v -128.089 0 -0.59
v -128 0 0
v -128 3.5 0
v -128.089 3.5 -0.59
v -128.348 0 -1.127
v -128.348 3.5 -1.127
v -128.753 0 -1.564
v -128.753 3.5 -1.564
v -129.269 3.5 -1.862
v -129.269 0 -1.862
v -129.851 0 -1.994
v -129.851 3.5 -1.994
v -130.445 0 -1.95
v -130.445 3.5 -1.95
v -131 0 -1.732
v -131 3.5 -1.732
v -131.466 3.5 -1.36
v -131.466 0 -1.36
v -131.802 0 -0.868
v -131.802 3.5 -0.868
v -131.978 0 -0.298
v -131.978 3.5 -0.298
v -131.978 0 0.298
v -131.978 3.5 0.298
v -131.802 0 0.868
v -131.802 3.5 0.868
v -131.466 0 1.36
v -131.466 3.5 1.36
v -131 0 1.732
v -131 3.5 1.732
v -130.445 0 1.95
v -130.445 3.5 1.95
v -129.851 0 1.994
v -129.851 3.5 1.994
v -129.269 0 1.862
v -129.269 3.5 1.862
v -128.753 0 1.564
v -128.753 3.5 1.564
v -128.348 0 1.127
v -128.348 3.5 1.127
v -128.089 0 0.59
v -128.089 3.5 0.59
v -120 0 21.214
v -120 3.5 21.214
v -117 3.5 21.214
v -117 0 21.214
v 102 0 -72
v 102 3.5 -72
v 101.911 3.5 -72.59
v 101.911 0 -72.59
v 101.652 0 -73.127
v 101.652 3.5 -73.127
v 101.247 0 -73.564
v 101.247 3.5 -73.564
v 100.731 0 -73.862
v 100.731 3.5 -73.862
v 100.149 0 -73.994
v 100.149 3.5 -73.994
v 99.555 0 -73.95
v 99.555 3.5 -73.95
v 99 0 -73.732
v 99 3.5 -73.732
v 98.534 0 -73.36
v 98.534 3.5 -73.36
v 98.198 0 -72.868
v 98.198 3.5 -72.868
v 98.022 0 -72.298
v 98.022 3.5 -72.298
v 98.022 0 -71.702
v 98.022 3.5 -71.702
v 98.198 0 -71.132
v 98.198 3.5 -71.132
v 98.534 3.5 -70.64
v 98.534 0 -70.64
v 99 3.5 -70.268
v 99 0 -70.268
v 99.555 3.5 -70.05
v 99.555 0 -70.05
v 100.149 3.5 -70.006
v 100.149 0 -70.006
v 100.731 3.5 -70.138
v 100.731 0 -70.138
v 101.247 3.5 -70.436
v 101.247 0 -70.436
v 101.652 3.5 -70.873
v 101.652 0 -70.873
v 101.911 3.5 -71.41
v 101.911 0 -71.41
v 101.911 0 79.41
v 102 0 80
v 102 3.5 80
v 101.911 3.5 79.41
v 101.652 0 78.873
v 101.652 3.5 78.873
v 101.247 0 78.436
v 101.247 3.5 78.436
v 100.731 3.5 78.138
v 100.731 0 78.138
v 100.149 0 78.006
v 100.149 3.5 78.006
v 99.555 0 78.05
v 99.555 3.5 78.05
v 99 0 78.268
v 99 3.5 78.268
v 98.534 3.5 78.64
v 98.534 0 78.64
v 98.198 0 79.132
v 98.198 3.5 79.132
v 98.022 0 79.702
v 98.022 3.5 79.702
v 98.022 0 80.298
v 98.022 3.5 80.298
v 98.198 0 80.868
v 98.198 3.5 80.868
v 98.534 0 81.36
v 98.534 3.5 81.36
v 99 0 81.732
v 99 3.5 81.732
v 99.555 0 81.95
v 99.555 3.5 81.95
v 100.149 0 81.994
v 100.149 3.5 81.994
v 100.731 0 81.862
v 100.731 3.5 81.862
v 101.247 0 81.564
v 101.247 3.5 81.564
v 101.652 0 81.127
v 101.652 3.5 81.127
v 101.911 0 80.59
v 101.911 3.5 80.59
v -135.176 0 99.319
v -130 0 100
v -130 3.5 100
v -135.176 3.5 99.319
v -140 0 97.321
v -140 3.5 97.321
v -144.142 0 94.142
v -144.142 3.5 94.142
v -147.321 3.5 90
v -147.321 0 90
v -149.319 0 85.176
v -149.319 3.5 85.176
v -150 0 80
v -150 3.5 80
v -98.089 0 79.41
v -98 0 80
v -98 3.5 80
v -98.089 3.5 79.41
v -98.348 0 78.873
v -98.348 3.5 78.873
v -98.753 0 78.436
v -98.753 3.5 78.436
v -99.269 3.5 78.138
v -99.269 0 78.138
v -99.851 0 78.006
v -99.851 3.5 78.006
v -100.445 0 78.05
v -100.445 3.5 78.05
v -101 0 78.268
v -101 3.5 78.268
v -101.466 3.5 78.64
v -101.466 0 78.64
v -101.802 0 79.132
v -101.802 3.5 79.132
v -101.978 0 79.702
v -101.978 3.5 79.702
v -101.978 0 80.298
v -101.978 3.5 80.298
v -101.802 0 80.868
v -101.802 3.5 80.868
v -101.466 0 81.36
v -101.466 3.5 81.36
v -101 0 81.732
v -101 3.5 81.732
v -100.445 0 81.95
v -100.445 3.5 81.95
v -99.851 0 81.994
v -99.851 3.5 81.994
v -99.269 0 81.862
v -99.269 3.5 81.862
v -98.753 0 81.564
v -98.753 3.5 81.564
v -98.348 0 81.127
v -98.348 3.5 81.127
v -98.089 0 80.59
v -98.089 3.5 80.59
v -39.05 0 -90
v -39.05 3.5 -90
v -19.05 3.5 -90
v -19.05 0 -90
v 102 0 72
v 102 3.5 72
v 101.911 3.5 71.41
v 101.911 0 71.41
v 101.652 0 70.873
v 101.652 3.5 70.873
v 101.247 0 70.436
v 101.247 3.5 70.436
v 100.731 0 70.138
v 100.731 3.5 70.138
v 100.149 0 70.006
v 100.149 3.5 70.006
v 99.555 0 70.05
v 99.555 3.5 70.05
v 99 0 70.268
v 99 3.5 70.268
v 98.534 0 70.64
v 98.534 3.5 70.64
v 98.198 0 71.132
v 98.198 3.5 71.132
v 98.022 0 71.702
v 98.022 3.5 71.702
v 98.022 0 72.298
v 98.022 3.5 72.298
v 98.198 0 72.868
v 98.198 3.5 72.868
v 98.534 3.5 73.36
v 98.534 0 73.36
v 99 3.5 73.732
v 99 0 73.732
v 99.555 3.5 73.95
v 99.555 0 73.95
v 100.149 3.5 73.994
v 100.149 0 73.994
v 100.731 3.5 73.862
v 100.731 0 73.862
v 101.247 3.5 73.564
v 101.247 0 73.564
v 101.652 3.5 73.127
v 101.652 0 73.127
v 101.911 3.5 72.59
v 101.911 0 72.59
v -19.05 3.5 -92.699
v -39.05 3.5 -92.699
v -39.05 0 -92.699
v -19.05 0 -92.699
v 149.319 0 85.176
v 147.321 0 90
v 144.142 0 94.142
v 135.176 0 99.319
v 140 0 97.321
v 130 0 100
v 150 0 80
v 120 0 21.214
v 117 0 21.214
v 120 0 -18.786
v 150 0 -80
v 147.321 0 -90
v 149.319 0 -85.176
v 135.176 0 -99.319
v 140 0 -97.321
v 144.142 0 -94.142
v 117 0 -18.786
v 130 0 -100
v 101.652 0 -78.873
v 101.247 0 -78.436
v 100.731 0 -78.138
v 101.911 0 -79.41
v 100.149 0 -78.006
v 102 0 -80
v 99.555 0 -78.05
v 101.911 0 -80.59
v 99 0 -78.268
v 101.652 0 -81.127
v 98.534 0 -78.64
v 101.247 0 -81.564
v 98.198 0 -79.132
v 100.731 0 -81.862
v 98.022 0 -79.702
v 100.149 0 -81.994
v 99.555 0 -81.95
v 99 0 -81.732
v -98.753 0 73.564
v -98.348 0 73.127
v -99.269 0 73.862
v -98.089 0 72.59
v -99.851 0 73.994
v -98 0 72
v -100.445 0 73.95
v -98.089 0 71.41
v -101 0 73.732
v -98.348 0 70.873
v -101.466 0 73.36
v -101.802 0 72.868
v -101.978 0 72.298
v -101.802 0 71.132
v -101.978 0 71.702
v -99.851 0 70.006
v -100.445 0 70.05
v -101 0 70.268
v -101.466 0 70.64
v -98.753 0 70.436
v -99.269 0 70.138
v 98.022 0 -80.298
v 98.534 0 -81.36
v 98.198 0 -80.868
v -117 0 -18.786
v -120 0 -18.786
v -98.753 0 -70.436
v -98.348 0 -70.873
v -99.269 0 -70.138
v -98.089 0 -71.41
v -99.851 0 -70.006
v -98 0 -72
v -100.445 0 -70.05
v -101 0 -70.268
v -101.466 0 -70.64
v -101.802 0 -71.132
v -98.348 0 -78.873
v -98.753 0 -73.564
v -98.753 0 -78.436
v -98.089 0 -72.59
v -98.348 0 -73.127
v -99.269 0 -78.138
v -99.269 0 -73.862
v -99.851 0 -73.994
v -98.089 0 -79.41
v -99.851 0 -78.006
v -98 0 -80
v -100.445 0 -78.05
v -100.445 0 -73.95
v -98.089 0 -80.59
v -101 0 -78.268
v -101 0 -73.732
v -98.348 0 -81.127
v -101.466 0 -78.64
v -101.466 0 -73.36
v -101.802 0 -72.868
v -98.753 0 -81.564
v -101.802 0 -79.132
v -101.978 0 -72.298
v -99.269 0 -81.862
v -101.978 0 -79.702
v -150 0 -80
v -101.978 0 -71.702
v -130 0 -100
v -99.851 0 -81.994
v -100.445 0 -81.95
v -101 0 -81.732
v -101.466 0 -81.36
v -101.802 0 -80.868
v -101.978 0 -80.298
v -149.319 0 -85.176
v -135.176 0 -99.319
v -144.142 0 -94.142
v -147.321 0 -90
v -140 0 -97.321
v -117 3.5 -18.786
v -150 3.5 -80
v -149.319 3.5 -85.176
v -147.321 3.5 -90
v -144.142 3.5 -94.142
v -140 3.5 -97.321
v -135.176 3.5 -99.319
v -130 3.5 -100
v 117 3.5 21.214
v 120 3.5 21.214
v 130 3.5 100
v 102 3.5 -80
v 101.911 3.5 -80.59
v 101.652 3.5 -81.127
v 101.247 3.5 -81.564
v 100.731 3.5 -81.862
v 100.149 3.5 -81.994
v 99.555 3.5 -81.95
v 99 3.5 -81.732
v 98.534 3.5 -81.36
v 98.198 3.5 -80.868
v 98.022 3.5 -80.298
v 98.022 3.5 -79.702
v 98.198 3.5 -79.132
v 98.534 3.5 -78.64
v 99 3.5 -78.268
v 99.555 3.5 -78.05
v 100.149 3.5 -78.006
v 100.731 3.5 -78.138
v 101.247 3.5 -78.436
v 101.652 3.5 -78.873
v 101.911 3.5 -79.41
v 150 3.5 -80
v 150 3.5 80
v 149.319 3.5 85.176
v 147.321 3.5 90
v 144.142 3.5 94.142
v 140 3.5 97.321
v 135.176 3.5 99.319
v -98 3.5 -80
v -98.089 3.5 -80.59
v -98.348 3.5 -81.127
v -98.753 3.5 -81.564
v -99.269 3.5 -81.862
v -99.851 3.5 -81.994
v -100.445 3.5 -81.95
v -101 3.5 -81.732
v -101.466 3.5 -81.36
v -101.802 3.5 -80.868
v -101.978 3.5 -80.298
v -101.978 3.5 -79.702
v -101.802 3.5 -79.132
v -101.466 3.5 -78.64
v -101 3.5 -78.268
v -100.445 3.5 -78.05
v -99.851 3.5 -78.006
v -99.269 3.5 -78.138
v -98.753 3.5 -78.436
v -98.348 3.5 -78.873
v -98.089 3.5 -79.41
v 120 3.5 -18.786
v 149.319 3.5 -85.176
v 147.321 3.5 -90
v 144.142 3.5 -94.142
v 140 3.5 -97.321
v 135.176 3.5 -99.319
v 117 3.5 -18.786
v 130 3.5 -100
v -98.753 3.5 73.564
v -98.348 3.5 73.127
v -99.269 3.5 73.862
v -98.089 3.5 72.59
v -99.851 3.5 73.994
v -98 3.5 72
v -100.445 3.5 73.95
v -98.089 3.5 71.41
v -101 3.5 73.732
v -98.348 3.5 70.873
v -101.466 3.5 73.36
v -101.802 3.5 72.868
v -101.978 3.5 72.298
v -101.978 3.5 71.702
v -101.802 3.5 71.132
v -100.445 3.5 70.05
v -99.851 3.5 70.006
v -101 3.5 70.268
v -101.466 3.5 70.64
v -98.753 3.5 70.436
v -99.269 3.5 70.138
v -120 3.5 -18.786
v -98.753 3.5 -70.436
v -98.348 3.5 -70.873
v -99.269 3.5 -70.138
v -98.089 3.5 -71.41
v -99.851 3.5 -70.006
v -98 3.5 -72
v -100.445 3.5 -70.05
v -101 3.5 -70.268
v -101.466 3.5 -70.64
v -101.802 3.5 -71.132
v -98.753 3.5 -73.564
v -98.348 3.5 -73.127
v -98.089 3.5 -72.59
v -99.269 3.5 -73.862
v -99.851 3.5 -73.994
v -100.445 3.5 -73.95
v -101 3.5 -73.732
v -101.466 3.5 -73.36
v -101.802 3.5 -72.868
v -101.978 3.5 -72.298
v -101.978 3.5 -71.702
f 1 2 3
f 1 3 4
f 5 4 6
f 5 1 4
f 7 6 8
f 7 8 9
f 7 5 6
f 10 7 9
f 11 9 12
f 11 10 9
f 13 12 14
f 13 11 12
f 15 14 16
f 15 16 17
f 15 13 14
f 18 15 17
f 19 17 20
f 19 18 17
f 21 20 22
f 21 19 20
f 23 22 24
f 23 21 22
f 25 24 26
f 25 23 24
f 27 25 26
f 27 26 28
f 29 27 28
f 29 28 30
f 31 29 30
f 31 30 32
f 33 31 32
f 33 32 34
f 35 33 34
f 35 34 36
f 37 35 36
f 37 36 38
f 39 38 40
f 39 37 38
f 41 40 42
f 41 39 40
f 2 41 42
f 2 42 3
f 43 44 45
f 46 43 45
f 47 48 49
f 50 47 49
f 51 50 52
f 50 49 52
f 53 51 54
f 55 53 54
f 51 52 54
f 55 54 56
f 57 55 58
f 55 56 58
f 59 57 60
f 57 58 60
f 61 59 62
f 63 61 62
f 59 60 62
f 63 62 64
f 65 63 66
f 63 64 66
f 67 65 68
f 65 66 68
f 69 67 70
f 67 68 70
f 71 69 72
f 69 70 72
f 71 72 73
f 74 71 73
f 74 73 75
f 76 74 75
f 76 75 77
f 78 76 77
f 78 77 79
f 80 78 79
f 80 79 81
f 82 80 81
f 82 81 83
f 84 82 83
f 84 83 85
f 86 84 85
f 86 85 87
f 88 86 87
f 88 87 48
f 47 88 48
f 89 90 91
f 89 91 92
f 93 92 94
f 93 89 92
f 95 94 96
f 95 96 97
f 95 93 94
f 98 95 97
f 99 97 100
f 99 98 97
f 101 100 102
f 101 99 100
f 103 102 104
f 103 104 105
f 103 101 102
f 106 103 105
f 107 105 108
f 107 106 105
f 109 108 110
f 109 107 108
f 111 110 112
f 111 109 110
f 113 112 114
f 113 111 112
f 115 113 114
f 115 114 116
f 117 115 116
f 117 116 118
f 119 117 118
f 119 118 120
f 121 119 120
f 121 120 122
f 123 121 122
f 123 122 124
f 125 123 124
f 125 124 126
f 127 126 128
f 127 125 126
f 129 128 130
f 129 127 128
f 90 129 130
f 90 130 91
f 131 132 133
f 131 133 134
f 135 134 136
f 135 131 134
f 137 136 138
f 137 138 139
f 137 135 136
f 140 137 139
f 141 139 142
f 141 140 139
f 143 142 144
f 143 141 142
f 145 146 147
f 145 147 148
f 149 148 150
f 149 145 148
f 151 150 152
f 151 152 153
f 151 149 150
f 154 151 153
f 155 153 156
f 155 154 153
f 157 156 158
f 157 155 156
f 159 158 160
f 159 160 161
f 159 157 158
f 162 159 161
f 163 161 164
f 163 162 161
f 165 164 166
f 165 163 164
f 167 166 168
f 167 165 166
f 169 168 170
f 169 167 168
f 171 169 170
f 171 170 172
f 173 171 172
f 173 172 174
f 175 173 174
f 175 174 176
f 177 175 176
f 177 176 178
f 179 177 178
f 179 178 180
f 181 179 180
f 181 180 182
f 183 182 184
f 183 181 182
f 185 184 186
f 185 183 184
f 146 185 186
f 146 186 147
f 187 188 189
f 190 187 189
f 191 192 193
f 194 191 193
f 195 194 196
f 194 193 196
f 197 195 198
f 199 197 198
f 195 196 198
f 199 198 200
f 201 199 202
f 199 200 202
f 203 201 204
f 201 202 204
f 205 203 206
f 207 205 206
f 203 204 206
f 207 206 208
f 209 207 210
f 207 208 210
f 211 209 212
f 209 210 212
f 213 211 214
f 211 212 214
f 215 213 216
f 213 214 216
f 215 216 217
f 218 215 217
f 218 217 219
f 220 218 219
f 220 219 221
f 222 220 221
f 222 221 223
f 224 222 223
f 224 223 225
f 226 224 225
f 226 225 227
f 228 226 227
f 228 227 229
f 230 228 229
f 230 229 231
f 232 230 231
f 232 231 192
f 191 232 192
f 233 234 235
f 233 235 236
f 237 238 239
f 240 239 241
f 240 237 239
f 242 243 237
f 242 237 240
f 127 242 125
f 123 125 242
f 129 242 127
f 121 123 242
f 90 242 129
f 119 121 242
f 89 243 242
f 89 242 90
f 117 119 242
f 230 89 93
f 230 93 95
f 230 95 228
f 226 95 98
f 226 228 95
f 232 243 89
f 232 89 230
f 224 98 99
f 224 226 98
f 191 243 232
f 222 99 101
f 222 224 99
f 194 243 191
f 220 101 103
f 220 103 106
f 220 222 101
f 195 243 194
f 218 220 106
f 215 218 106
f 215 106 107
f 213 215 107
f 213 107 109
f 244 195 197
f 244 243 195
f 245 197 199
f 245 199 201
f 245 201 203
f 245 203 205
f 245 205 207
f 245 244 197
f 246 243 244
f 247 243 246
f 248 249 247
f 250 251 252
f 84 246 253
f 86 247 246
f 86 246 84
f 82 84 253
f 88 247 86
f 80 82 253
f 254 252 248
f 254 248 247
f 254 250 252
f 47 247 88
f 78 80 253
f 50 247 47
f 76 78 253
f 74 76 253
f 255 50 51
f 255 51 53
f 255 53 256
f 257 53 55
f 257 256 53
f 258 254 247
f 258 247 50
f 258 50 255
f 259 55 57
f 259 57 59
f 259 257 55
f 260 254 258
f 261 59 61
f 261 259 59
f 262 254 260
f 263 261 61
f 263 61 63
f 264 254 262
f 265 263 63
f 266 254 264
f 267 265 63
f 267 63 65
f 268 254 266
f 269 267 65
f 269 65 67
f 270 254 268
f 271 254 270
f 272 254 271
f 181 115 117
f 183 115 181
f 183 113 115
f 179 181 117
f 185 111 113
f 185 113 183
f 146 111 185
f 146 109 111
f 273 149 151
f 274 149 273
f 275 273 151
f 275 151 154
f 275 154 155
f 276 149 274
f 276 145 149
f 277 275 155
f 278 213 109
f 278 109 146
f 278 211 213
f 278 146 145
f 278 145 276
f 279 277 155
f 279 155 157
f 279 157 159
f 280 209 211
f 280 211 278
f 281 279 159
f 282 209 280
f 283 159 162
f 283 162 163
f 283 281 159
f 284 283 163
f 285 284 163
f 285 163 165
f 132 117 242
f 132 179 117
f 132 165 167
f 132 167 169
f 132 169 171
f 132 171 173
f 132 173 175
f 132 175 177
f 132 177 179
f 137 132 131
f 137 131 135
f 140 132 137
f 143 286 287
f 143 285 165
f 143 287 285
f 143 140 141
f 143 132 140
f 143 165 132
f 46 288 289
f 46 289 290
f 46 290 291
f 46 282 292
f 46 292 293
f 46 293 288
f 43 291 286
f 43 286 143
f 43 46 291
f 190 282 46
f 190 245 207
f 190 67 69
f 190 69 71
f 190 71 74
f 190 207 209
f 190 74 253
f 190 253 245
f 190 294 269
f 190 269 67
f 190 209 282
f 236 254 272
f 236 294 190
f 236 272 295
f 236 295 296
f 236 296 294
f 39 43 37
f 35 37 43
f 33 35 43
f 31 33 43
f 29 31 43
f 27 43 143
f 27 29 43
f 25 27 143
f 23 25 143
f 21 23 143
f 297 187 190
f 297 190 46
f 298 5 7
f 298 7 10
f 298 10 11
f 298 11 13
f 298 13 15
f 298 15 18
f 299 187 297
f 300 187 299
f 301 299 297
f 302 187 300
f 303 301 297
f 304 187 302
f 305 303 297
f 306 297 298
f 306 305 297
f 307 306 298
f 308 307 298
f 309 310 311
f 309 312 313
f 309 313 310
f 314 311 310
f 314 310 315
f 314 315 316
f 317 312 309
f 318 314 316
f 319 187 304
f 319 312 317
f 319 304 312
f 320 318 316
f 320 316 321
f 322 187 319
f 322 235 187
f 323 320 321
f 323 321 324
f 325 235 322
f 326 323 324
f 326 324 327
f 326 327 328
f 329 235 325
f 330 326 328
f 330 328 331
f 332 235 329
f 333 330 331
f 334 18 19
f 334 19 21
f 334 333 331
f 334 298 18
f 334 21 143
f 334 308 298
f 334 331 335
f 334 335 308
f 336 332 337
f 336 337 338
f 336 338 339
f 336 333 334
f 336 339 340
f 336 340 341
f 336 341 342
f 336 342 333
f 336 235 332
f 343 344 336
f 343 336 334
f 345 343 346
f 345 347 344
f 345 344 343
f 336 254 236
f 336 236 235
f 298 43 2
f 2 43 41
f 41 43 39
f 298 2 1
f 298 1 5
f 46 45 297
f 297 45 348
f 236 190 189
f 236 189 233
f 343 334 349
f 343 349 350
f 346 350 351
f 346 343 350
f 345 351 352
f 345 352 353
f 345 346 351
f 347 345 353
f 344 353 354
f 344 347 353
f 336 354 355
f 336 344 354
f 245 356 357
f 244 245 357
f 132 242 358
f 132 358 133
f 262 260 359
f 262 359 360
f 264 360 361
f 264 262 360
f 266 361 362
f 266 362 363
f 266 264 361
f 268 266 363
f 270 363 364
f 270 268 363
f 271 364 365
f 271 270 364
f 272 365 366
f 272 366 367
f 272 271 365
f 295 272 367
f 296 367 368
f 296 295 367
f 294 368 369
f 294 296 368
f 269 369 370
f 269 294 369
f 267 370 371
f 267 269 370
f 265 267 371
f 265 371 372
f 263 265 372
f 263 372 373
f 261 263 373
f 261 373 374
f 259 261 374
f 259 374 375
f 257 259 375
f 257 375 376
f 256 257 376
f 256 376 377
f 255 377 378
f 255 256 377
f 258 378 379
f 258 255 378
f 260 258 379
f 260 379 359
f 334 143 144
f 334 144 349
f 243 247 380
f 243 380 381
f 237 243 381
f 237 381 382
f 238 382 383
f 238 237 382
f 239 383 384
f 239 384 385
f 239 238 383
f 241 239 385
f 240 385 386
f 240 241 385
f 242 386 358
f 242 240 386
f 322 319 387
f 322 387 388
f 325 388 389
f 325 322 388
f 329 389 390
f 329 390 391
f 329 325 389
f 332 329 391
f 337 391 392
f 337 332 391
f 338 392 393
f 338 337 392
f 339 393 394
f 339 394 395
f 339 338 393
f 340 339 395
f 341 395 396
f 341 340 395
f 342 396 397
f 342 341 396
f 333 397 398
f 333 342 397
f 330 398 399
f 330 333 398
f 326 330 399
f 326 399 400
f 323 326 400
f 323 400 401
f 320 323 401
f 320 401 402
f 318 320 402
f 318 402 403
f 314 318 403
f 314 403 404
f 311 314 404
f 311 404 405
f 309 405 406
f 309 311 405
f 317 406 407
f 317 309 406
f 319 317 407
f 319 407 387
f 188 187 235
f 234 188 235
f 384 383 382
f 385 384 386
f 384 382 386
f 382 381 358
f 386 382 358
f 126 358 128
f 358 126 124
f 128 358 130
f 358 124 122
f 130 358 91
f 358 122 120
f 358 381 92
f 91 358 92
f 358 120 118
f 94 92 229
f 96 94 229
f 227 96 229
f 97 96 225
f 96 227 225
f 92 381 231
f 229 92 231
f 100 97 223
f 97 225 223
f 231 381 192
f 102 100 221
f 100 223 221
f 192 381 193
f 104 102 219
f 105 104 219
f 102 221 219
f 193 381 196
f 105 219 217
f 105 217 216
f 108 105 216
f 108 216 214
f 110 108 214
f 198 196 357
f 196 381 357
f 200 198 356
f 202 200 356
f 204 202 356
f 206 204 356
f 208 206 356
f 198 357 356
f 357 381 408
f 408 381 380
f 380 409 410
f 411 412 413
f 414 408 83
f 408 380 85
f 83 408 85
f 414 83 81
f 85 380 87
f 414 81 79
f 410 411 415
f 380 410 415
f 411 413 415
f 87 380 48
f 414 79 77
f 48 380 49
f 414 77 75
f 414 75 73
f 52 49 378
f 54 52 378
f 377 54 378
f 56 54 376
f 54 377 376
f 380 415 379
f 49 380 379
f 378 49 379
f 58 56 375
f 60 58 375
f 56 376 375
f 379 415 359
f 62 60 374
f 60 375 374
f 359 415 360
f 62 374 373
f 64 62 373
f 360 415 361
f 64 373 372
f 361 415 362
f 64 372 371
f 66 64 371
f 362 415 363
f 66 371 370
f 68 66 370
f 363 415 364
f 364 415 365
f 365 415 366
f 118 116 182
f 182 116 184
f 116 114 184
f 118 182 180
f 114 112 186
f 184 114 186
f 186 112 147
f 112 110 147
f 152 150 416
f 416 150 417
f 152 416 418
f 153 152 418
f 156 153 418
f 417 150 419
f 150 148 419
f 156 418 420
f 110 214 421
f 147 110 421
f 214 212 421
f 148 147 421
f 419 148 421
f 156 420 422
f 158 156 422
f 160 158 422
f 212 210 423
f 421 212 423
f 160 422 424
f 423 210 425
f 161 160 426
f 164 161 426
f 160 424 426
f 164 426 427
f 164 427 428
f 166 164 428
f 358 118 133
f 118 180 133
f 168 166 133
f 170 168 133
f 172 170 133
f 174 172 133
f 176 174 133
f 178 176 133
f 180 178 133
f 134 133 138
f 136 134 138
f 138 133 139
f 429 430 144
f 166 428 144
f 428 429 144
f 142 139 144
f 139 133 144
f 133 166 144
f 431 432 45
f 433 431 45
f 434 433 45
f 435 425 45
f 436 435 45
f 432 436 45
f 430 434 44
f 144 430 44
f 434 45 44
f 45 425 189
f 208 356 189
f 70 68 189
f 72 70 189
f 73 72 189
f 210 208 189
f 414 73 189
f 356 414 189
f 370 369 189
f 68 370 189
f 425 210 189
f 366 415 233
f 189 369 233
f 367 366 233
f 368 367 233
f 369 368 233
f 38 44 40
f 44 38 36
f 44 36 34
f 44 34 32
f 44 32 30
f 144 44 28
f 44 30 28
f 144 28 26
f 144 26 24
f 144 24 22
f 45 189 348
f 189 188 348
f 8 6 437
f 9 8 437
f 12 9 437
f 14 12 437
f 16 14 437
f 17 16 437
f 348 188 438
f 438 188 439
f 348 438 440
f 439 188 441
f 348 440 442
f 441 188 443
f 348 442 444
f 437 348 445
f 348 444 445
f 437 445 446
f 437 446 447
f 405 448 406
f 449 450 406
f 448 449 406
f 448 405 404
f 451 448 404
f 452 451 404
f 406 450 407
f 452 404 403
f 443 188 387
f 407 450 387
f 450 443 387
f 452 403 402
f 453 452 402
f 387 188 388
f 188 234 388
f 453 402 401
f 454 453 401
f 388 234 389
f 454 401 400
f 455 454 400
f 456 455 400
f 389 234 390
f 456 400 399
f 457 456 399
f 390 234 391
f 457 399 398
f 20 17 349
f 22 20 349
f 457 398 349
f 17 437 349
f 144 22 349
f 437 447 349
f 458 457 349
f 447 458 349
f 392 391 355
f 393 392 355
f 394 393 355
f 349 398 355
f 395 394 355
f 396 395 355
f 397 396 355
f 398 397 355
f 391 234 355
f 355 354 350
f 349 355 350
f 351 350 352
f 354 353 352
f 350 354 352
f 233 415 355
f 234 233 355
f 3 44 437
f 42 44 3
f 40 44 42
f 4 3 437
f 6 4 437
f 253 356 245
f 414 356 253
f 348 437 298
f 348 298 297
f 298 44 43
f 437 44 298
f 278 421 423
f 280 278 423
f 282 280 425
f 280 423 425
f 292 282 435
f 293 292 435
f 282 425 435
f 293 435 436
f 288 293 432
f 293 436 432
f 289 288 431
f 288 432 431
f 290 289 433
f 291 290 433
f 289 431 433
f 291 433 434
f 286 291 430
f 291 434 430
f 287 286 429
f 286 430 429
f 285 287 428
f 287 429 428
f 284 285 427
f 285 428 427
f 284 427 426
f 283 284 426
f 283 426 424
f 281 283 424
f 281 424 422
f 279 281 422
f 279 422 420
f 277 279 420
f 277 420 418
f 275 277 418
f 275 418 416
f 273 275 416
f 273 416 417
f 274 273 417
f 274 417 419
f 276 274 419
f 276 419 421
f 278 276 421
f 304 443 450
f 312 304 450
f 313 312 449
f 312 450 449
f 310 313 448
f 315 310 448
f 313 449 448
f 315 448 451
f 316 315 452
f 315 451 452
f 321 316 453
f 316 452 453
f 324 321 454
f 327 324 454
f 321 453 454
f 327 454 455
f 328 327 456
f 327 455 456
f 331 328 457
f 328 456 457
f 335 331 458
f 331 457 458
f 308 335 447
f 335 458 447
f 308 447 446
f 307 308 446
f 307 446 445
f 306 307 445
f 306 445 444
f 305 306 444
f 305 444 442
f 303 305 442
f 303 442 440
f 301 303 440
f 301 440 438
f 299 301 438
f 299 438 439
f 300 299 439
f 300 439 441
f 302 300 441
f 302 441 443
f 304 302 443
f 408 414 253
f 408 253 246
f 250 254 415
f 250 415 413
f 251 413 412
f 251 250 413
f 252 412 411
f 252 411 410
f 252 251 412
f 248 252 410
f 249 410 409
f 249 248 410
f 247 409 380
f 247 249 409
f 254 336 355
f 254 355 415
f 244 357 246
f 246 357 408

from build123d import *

# Parameters (mm, degrees)
SKETCH1_R           = 2
BOSS_EXTRUDE1_DEPTH = 3.5
SKETCH3_R           = 2
SKETCH3_W           = 3
SKETCH3_H           = 40
SKETCH3_W_2         = 20
SKETCH3_H_2         = 2.698971111
CUT_EXTRUDE2_DEPTH  = 10


with BuildPart() as part:
    # Sketch1 → Boss-Extrude1 (new body)
    with BuildSketch(Plane(origin=(0, 0, 0), x_dir=(1, 0, 0), z_dir=(0, 1, 0))):
        with BuildLine():
            Line((130, -100), (-130, -100))
            ThreePointArc((-130, -100), (-144.142135624, -94.142135624), (-150, -80))
            Line((-150, -80), (-150, 80))
            ThreePointArc((-150, 80), (-144.142135624, 94.142135624), (-130, 100))
            Line((-130, 100), (130, 100))
            ThreePointArc((130, 100), (144.142135624, 94.142135624), (150, 80))
            Line((150, 80), (150, -80))
            ThreePointArc((150, -80), (144.142135624, -94.142135624), (130, -100))
        make_face()
        with Locations((-100, 80)):
            Circle(SKETCH1_R, mode=Mode.SUBTRACT)
        with Locations((100, 80)):
            Circle(SKETCH1_R, mode=Mode.SUBTRACT)
        with Locations((100, -80)):
            Circle(SKETCH1_R, mode=Mode.SUBTRACT)
        with Locations((-100, -80)):
            Circle(SKETCH1_R, mode=Mode.SUBTRACT)
        with Locations((-130, 0)):
            Circle(SKETCH1_R, mode=Mode.SUBTRACT)
    extrude(amount=BOSS_EXTRUDE1_DEPTH)

    # Sketch3 → Cut-Extrude2 (cut)
    with BuildSketch(Plane(origin=(0, 3.5, 0), x_dir=(1, 0, 0), z_dir=(0, 1, 0))):
        with Locations((-100, 72)):
            Circle(SKETCH3_R)
        with Locations((-100, -72)):
            Circle(SKETCH3_R)
        with Locations((100, -72)):
            Circle(SKETCH3_R)
        with Locations((100, 72)):
            Circle(SKETCH3_R)
        with Locations((-118.5, -1.214097356)):
            Rectangle(SKETCH3_W, SKETCH3_H)
        with Locations((118.5, -1.214097356)):
            Rectangle(SKETCH3_W, SKETCH3_H)
        with Locations((-29.050201182, 91.349485555)):
            Rectangle(SKETCH3_W_2, SKETCH3_H_2)
    extrude(amount=-CUT_EXTRUDE2_DEPTH, mode=Mode.SUBTRACT)


solid = part.part
